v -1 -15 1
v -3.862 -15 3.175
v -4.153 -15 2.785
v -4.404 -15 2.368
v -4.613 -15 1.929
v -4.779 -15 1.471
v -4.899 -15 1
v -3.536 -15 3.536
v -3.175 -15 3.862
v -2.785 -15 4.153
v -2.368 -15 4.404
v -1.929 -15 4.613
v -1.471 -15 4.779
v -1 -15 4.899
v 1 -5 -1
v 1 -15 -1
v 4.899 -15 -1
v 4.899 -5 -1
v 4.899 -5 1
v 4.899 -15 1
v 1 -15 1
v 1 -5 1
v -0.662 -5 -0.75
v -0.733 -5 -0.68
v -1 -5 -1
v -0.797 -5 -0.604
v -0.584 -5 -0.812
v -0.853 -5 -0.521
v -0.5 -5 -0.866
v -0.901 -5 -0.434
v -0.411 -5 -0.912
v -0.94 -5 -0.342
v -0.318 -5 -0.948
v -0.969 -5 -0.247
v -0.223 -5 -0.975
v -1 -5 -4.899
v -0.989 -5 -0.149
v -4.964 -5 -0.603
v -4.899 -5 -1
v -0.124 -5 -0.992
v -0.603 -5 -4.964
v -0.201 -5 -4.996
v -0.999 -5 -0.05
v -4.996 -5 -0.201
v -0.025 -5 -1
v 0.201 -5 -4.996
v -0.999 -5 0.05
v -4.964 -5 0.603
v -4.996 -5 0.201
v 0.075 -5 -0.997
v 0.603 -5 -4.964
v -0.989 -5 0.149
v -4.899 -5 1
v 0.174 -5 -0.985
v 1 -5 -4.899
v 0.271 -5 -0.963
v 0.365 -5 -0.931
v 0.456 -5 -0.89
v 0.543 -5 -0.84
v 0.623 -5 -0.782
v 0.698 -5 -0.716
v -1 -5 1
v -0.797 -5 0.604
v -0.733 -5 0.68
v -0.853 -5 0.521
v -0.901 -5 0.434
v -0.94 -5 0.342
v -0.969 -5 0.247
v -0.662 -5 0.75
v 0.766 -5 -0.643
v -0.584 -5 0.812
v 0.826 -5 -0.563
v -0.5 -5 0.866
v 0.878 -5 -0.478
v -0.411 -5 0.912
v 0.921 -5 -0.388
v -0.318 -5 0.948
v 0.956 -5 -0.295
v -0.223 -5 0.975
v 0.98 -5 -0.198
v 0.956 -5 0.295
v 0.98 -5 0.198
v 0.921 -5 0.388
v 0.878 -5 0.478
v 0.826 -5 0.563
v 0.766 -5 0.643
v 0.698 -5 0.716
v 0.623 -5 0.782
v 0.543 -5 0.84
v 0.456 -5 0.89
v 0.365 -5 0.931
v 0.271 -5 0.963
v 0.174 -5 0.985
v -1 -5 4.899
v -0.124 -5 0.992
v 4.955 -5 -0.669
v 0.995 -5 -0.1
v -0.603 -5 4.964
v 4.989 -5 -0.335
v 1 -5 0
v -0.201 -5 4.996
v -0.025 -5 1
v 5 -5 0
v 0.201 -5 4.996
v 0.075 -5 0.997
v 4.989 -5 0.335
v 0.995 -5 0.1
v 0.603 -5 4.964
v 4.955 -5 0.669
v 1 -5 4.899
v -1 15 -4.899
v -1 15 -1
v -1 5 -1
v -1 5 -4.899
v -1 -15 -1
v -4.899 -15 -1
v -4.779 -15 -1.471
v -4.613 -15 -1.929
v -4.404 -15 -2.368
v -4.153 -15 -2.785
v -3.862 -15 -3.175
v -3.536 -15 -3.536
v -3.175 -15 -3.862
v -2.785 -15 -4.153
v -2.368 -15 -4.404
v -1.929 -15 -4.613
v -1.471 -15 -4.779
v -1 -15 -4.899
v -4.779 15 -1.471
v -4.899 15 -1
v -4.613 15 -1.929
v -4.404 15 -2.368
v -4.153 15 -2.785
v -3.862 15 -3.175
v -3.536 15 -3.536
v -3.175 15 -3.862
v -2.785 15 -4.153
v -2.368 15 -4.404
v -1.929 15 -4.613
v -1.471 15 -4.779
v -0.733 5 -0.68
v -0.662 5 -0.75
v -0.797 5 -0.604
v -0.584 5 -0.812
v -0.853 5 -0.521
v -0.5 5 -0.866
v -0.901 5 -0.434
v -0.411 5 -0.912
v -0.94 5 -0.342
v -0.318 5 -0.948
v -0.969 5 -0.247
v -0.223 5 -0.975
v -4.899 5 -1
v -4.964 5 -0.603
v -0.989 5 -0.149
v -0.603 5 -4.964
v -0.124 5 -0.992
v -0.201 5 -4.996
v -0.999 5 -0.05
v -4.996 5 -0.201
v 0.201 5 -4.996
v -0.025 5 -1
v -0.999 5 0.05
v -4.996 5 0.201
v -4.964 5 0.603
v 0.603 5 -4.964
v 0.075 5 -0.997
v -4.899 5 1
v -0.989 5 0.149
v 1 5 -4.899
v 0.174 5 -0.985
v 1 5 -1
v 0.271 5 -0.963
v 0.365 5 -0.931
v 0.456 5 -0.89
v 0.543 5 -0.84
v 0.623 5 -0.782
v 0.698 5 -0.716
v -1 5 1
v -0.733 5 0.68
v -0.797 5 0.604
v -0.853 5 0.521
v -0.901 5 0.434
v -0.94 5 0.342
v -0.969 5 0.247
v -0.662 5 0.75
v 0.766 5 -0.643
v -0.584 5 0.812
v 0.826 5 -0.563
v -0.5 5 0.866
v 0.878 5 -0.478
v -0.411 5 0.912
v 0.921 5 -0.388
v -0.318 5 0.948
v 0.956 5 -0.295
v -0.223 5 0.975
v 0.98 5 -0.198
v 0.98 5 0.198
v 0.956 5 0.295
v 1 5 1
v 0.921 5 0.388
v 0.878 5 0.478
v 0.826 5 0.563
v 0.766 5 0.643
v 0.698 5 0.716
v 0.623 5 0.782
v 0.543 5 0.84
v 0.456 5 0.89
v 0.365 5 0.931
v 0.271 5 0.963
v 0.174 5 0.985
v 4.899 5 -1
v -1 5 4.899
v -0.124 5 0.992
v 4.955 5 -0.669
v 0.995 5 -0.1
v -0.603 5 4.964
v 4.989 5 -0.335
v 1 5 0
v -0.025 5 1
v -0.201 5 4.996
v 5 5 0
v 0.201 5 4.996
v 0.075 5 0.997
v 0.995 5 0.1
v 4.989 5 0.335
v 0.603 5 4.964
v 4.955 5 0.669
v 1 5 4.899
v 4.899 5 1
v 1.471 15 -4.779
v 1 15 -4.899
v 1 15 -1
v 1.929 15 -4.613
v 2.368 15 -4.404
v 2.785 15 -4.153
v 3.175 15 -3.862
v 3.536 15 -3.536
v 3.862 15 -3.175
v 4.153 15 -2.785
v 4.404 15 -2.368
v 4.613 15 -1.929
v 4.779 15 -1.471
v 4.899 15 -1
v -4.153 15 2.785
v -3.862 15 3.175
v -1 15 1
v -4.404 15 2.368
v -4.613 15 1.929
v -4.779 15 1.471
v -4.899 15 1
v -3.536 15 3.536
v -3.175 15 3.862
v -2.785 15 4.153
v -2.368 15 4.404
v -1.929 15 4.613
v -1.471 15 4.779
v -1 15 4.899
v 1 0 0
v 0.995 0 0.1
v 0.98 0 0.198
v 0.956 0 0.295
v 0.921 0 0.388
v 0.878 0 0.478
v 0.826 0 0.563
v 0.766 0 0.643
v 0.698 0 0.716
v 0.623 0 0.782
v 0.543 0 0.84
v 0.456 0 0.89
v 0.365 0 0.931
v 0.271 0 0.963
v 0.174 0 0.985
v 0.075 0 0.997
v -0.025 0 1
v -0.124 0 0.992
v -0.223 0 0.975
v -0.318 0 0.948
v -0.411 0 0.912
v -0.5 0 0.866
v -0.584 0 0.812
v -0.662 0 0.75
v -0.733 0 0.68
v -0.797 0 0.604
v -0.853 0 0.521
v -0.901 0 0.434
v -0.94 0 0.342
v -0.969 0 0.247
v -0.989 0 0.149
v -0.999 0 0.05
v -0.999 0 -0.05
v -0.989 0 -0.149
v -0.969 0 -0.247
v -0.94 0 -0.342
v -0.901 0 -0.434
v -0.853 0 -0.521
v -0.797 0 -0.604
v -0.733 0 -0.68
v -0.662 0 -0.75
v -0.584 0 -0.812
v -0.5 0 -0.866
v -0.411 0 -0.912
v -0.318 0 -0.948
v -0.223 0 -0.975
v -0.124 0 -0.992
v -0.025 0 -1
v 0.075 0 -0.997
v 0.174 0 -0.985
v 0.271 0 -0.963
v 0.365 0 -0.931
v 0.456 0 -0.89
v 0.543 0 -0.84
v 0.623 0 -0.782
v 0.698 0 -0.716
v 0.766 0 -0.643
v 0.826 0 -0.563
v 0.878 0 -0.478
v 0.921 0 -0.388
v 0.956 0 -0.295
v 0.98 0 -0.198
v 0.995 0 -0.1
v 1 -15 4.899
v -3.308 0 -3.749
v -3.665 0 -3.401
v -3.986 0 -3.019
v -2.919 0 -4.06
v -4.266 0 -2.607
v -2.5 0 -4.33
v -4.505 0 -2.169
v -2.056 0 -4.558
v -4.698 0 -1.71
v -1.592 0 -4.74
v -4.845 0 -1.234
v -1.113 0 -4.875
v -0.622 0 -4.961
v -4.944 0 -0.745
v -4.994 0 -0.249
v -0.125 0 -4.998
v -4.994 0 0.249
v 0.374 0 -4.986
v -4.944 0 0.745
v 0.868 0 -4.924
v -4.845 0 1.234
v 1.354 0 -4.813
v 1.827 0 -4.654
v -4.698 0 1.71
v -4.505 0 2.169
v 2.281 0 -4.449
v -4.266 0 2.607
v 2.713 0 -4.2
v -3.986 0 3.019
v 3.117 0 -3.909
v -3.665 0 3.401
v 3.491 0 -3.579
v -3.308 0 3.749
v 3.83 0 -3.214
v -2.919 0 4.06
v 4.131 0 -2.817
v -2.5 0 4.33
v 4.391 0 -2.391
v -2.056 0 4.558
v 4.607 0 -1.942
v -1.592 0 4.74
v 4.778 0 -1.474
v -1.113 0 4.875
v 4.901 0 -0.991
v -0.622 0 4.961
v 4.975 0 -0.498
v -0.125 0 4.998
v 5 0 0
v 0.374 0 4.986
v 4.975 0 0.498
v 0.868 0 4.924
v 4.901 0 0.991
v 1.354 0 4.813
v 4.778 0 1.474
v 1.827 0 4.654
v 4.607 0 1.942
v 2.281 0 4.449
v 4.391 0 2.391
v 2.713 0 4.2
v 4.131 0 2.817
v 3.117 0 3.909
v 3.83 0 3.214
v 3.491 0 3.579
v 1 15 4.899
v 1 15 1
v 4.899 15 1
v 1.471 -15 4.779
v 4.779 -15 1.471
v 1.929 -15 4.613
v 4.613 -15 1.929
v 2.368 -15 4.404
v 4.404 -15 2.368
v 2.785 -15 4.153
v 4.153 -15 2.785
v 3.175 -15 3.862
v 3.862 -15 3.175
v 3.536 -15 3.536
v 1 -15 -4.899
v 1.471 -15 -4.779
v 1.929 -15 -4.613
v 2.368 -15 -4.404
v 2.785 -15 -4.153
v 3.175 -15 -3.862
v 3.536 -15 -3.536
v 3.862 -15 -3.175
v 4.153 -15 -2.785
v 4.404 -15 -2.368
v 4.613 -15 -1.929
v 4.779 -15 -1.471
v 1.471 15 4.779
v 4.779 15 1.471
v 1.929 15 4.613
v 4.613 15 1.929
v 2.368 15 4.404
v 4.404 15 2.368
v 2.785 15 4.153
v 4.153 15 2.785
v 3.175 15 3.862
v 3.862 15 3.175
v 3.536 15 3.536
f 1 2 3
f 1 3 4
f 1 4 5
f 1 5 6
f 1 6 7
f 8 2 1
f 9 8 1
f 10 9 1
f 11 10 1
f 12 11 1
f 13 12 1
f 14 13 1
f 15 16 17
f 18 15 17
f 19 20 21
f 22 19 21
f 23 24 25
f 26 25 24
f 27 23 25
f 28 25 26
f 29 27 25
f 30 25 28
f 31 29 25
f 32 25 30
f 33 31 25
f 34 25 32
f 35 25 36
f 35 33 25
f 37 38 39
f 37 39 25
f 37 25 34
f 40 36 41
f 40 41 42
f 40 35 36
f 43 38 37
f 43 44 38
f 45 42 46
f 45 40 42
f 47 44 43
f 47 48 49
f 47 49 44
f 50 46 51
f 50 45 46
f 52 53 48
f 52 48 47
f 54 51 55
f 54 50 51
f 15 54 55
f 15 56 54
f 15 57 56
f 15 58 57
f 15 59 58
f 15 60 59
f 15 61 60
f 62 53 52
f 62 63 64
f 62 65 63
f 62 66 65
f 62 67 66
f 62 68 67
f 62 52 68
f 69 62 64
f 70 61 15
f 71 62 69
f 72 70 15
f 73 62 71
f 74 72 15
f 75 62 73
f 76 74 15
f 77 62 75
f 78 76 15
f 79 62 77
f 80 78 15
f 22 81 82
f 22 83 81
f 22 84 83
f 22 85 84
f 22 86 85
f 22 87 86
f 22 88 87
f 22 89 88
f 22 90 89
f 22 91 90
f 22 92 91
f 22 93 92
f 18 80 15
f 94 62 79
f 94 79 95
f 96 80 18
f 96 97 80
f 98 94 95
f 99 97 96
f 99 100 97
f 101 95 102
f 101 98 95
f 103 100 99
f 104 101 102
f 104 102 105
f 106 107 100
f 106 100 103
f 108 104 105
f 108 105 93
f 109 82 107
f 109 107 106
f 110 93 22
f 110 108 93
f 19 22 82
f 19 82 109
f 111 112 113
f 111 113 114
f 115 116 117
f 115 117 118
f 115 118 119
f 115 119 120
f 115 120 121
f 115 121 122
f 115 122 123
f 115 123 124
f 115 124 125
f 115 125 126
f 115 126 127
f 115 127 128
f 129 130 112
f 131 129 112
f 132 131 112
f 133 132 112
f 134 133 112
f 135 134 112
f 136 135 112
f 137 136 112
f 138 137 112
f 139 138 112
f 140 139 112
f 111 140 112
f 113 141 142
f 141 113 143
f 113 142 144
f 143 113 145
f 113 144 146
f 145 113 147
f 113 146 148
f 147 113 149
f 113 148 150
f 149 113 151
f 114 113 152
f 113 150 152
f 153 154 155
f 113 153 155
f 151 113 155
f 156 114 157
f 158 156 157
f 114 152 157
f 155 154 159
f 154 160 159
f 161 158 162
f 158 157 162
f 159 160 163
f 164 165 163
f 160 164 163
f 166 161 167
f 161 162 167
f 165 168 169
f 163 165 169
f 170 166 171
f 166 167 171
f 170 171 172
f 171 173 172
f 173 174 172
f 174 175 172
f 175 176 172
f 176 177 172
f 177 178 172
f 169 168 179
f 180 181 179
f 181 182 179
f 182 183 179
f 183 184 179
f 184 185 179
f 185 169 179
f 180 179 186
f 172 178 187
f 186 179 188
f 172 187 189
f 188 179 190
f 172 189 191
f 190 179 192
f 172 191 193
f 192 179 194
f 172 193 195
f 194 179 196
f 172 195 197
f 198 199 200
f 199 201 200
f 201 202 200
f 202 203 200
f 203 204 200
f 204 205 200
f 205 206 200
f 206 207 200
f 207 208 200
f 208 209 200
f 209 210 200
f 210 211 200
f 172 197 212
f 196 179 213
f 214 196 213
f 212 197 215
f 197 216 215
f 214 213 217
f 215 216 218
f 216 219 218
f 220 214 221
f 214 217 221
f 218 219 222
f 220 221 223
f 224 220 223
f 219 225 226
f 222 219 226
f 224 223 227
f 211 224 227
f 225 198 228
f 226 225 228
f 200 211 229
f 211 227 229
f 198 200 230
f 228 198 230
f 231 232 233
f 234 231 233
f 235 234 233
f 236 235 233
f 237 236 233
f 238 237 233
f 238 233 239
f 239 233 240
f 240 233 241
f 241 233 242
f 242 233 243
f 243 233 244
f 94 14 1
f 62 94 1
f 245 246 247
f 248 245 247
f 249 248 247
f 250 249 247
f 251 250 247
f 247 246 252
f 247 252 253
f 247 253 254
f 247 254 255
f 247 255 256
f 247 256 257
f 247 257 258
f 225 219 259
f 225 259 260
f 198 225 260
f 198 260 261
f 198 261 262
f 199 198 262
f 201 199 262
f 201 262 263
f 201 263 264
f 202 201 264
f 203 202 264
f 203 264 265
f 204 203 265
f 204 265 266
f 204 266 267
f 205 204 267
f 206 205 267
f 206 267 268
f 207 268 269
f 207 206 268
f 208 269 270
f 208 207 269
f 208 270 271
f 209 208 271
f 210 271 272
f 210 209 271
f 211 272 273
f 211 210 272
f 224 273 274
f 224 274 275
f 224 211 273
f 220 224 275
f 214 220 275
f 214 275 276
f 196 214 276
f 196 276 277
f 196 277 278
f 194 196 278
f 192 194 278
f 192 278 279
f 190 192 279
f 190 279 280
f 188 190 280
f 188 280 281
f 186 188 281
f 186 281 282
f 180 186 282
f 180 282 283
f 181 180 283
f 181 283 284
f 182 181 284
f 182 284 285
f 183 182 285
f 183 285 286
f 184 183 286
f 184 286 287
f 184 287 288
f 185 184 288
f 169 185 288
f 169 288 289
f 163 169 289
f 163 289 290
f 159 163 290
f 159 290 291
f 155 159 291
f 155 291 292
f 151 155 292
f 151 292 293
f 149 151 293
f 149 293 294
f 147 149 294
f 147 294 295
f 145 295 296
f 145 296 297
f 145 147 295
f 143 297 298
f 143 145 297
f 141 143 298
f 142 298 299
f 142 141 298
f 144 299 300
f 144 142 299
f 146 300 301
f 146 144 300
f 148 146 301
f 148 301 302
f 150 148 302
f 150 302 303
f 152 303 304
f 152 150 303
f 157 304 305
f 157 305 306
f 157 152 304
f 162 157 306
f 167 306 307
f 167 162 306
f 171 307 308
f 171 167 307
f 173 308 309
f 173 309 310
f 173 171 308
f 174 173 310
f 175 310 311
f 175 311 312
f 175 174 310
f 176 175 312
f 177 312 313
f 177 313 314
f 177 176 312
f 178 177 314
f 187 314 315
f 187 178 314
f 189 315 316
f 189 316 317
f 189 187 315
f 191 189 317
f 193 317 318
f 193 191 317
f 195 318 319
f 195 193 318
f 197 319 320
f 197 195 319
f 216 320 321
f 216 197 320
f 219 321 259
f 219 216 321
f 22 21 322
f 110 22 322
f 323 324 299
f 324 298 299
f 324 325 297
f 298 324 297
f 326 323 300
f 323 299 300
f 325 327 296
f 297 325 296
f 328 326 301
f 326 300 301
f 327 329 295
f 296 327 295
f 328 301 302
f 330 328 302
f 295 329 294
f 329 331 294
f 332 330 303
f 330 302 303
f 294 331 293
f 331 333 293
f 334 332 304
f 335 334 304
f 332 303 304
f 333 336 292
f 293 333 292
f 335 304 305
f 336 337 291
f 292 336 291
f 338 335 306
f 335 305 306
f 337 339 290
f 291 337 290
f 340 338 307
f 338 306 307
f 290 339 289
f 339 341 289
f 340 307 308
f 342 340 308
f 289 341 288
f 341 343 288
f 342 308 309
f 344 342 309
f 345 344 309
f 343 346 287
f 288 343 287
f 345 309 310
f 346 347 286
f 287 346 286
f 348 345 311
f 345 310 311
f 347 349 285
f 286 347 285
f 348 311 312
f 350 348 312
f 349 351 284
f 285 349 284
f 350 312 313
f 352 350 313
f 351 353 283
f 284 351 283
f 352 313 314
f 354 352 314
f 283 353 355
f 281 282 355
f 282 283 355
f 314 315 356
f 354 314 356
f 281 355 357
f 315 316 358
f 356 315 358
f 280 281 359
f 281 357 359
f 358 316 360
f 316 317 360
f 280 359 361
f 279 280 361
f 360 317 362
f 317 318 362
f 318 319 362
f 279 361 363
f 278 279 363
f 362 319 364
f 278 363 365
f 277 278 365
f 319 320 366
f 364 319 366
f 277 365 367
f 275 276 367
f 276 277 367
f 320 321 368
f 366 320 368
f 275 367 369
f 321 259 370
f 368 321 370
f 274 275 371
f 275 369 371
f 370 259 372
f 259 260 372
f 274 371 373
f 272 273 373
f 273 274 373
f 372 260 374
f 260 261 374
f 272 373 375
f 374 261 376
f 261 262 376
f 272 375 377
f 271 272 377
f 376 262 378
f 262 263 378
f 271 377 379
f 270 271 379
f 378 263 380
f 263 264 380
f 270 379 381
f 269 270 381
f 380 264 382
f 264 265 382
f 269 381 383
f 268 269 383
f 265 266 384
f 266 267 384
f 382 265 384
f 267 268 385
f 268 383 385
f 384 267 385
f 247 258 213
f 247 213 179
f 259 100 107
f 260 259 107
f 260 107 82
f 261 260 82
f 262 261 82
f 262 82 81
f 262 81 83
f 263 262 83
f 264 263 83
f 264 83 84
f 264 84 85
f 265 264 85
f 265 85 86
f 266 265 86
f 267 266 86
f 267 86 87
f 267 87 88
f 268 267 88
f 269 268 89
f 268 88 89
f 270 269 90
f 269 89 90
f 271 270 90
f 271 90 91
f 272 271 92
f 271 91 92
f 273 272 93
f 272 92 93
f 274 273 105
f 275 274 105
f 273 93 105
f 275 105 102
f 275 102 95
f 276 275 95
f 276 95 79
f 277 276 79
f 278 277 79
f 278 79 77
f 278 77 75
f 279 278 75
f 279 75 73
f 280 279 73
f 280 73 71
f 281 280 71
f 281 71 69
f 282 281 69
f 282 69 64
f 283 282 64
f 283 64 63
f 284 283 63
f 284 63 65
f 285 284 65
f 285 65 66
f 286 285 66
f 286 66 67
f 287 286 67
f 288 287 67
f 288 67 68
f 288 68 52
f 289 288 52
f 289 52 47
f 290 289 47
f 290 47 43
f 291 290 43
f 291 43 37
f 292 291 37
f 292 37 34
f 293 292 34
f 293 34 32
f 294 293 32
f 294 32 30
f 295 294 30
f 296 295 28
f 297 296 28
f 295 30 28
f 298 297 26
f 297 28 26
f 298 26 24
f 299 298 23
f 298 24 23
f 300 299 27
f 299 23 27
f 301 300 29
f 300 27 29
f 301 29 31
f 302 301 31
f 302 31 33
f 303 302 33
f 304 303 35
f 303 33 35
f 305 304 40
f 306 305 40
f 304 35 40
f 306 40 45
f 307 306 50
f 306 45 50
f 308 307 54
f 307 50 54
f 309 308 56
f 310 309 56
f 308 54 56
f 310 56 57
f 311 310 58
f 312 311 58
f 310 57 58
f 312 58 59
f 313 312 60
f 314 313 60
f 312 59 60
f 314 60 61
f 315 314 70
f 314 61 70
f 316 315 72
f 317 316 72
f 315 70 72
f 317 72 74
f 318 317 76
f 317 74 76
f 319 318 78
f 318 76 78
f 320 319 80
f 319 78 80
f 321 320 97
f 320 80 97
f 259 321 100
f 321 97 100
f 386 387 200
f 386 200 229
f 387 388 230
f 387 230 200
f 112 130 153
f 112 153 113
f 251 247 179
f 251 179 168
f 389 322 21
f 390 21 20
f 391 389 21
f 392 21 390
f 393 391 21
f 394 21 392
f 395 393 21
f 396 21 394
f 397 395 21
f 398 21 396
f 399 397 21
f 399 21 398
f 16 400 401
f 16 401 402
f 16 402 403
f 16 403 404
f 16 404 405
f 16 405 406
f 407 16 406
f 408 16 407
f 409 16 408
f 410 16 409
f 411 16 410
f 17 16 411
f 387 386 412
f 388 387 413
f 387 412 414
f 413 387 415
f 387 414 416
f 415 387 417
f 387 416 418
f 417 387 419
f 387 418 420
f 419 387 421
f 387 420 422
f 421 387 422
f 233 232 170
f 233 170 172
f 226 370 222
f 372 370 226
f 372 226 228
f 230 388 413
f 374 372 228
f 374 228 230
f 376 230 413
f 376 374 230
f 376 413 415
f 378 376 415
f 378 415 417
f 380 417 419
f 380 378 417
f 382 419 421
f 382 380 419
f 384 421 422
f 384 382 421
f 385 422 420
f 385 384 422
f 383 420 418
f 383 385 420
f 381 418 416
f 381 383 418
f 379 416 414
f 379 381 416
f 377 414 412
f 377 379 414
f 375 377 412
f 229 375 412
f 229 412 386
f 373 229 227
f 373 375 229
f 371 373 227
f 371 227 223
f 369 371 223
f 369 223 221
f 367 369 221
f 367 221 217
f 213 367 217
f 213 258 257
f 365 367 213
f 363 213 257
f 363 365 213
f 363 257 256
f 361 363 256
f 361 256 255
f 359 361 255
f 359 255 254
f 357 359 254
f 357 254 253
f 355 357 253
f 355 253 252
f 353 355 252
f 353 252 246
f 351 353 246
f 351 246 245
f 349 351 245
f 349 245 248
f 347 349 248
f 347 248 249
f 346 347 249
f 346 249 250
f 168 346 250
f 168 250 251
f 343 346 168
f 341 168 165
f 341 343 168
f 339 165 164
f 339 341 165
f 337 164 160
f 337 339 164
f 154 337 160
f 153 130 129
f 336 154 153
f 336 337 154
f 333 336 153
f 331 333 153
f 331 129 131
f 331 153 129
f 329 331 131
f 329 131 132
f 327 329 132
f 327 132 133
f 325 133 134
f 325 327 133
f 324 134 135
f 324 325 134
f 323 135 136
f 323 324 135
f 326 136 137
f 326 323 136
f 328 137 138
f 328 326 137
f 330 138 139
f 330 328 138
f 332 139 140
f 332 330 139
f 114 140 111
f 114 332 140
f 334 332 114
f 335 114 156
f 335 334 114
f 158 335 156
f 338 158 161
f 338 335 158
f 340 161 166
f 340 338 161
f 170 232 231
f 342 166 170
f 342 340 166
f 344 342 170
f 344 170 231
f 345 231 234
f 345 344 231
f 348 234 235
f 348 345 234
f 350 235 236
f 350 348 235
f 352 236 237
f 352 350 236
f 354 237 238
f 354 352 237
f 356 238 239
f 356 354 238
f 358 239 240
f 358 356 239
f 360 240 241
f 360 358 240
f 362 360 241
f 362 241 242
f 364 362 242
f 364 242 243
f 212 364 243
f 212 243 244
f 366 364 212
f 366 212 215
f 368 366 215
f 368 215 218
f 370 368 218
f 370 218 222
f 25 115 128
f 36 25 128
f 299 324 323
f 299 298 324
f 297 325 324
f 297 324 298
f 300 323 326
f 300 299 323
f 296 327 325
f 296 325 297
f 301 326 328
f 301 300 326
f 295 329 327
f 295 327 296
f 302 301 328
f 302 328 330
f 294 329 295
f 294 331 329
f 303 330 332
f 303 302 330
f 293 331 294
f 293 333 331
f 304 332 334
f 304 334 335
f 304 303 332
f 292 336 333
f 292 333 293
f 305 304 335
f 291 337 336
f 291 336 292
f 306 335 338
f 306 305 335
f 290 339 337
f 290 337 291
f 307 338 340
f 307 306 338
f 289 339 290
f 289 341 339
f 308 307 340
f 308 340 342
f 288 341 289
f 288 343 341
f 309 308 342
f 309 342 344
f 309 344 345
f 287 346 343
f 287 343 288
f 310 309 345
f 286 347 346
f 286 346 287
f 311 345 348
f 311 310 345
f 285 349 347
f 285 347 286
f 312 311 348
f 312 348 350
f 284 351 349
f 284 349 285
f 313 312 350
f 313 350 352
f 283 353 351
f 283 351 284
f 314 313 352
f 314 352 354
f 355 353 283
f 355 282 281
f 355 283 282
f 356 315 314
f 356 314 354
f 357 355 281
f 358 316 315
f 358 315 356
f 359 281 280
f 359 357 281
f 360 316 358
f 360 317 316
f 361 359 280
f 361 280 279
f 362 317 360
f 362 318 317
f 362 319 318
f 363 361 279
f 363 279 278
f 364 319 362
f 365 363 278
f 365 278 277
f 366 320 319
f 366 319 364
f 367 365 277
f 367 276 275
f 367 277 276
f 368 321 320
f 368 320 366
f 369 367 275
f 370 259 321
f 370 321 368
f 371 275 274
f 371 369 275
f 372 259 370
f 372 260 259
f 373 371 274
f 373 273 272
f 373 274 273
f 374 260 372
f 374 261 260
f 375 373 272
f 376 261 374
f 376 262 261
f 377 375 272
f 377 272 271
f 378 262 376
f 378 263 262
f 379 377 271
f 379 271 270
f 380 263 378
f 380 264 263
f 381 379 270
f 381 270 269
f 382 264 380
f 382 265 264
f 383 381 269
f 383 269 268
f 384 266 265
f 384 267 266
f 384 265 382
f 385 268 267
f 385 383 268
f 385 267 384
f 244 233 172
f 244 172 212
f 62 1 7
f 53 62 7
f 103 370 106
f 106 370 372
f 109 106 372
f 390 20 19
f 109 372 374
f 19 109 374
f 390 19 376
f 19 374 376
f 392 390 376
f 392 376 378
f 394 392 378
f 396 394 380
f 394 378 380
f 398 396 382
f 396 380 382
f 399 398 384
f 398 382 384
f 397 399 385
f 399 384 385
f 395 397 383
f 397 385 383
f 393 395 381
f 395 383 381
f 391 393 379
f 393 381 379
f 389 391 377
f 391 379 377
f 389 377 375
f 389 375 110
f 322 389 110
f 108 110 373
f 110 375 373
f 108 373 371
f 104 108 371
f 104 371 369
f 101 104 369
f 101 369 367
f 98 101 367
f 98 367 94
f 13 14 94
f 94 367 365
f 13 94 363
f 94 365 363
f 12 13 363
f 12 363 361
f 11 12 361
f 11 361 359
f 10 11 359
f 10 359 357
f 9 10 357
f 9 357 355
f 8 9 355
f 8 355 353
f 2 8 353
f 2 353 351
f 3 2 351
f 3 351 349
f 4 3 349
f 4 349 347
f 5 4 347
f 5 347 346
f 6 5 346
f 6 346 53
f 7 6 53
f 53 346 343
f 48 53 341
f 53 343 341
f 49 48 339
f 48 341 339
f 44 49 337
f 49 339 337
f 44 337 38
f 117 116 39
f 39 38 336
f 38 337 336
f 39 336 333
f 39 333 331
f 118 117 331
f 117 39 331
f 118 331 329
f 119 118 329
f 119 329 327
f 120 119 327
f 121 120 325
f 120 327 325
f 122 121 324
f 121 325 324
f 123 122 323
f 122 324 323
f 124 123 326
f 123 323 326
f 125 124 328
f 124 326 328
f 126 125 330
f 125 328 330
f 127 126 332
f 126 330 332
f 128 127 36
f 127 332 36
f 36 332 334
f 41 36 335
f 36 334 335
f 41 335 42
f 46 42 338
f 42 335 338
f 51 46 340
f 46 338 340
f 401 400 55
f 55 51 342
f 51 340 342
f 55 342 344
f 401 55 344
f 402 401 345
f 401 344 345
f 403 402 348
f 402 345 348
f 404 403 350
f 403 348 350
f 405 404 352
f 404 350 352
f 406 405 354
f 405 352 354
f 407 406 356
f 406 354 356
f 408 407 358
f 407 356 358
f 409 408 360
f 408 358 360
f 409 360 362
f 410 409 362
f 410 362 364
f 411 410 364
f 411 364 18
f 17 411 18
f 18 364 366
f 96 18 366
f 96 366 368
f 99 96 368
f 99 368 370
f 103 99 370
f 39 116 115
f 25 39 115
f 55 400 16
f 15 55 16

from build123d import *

# Parameters (mm, degrees)
F0_R     = 5
F1_DEPTH = 15
F3_DEPTH = 10
F4_R     = 1
F5_DEPTH = 5.001


with BuildPart() as f1:
    # F0 (on Front) → F1 (new body)
    with BuildSketch(Plane.XZ):
        Circle(F0_R)
    extrude(amount=F1_DEPTH)

    # F2 (on face) → F3 (cut)
    with BuildSketch(Plane.XZ.offset(15)):
        with BuildLine():
            ThreePointArc((-1, -4.8989794856), (0, -5), (1, -4.8989794856))
            Line((1, -4.8989794856), (1, -1))
            Line((1, -1), (4.8989794856, -1))
            ThreePointArc((4.8989794856, -1), (4.974680765, -0.50254481), (5, 0))
            ThreePointArc((5, 0), (4.974680765, 0.50254481), (4.8989794856, 1))
            Line((4.8989794856, 1), (1, 1))
            Line((1, 1), (1, 4.8989794856))
            ThreePointArc((1, 4.8989794856), (0, 5), (-1, 4.8989794856))
            Line((-1, 4.8989794856), (-1, 1))
            Line((-1, 1), (-4.8989794856, 1))
            ThreePointArc((-4.8989794856, 1), (-5, 0), (-4.8989794856, -1))
            Line((-4.8989794856, -1), (-1, -1))
            Line((-1, -1), (-1, -4.8989794856))
        make_face()
    extrude(amount=-F3_DEPTH, mode=Mode.SUBTRACT)

    # F4 (on face) → F5 (cut, through all)
    with BuildSketch(Plane.XZ.offset(5)):
        Circle(F4_R)
    extrude(amount=-F5_DEPTH, mode=Mode.SUBTRACT)


with BuildPart() as f6_1:
    # F6: instance of F1
    add(f1.part.mirror(Plane.XZ))


solid = Compound([f1.part, f6_1.part])
